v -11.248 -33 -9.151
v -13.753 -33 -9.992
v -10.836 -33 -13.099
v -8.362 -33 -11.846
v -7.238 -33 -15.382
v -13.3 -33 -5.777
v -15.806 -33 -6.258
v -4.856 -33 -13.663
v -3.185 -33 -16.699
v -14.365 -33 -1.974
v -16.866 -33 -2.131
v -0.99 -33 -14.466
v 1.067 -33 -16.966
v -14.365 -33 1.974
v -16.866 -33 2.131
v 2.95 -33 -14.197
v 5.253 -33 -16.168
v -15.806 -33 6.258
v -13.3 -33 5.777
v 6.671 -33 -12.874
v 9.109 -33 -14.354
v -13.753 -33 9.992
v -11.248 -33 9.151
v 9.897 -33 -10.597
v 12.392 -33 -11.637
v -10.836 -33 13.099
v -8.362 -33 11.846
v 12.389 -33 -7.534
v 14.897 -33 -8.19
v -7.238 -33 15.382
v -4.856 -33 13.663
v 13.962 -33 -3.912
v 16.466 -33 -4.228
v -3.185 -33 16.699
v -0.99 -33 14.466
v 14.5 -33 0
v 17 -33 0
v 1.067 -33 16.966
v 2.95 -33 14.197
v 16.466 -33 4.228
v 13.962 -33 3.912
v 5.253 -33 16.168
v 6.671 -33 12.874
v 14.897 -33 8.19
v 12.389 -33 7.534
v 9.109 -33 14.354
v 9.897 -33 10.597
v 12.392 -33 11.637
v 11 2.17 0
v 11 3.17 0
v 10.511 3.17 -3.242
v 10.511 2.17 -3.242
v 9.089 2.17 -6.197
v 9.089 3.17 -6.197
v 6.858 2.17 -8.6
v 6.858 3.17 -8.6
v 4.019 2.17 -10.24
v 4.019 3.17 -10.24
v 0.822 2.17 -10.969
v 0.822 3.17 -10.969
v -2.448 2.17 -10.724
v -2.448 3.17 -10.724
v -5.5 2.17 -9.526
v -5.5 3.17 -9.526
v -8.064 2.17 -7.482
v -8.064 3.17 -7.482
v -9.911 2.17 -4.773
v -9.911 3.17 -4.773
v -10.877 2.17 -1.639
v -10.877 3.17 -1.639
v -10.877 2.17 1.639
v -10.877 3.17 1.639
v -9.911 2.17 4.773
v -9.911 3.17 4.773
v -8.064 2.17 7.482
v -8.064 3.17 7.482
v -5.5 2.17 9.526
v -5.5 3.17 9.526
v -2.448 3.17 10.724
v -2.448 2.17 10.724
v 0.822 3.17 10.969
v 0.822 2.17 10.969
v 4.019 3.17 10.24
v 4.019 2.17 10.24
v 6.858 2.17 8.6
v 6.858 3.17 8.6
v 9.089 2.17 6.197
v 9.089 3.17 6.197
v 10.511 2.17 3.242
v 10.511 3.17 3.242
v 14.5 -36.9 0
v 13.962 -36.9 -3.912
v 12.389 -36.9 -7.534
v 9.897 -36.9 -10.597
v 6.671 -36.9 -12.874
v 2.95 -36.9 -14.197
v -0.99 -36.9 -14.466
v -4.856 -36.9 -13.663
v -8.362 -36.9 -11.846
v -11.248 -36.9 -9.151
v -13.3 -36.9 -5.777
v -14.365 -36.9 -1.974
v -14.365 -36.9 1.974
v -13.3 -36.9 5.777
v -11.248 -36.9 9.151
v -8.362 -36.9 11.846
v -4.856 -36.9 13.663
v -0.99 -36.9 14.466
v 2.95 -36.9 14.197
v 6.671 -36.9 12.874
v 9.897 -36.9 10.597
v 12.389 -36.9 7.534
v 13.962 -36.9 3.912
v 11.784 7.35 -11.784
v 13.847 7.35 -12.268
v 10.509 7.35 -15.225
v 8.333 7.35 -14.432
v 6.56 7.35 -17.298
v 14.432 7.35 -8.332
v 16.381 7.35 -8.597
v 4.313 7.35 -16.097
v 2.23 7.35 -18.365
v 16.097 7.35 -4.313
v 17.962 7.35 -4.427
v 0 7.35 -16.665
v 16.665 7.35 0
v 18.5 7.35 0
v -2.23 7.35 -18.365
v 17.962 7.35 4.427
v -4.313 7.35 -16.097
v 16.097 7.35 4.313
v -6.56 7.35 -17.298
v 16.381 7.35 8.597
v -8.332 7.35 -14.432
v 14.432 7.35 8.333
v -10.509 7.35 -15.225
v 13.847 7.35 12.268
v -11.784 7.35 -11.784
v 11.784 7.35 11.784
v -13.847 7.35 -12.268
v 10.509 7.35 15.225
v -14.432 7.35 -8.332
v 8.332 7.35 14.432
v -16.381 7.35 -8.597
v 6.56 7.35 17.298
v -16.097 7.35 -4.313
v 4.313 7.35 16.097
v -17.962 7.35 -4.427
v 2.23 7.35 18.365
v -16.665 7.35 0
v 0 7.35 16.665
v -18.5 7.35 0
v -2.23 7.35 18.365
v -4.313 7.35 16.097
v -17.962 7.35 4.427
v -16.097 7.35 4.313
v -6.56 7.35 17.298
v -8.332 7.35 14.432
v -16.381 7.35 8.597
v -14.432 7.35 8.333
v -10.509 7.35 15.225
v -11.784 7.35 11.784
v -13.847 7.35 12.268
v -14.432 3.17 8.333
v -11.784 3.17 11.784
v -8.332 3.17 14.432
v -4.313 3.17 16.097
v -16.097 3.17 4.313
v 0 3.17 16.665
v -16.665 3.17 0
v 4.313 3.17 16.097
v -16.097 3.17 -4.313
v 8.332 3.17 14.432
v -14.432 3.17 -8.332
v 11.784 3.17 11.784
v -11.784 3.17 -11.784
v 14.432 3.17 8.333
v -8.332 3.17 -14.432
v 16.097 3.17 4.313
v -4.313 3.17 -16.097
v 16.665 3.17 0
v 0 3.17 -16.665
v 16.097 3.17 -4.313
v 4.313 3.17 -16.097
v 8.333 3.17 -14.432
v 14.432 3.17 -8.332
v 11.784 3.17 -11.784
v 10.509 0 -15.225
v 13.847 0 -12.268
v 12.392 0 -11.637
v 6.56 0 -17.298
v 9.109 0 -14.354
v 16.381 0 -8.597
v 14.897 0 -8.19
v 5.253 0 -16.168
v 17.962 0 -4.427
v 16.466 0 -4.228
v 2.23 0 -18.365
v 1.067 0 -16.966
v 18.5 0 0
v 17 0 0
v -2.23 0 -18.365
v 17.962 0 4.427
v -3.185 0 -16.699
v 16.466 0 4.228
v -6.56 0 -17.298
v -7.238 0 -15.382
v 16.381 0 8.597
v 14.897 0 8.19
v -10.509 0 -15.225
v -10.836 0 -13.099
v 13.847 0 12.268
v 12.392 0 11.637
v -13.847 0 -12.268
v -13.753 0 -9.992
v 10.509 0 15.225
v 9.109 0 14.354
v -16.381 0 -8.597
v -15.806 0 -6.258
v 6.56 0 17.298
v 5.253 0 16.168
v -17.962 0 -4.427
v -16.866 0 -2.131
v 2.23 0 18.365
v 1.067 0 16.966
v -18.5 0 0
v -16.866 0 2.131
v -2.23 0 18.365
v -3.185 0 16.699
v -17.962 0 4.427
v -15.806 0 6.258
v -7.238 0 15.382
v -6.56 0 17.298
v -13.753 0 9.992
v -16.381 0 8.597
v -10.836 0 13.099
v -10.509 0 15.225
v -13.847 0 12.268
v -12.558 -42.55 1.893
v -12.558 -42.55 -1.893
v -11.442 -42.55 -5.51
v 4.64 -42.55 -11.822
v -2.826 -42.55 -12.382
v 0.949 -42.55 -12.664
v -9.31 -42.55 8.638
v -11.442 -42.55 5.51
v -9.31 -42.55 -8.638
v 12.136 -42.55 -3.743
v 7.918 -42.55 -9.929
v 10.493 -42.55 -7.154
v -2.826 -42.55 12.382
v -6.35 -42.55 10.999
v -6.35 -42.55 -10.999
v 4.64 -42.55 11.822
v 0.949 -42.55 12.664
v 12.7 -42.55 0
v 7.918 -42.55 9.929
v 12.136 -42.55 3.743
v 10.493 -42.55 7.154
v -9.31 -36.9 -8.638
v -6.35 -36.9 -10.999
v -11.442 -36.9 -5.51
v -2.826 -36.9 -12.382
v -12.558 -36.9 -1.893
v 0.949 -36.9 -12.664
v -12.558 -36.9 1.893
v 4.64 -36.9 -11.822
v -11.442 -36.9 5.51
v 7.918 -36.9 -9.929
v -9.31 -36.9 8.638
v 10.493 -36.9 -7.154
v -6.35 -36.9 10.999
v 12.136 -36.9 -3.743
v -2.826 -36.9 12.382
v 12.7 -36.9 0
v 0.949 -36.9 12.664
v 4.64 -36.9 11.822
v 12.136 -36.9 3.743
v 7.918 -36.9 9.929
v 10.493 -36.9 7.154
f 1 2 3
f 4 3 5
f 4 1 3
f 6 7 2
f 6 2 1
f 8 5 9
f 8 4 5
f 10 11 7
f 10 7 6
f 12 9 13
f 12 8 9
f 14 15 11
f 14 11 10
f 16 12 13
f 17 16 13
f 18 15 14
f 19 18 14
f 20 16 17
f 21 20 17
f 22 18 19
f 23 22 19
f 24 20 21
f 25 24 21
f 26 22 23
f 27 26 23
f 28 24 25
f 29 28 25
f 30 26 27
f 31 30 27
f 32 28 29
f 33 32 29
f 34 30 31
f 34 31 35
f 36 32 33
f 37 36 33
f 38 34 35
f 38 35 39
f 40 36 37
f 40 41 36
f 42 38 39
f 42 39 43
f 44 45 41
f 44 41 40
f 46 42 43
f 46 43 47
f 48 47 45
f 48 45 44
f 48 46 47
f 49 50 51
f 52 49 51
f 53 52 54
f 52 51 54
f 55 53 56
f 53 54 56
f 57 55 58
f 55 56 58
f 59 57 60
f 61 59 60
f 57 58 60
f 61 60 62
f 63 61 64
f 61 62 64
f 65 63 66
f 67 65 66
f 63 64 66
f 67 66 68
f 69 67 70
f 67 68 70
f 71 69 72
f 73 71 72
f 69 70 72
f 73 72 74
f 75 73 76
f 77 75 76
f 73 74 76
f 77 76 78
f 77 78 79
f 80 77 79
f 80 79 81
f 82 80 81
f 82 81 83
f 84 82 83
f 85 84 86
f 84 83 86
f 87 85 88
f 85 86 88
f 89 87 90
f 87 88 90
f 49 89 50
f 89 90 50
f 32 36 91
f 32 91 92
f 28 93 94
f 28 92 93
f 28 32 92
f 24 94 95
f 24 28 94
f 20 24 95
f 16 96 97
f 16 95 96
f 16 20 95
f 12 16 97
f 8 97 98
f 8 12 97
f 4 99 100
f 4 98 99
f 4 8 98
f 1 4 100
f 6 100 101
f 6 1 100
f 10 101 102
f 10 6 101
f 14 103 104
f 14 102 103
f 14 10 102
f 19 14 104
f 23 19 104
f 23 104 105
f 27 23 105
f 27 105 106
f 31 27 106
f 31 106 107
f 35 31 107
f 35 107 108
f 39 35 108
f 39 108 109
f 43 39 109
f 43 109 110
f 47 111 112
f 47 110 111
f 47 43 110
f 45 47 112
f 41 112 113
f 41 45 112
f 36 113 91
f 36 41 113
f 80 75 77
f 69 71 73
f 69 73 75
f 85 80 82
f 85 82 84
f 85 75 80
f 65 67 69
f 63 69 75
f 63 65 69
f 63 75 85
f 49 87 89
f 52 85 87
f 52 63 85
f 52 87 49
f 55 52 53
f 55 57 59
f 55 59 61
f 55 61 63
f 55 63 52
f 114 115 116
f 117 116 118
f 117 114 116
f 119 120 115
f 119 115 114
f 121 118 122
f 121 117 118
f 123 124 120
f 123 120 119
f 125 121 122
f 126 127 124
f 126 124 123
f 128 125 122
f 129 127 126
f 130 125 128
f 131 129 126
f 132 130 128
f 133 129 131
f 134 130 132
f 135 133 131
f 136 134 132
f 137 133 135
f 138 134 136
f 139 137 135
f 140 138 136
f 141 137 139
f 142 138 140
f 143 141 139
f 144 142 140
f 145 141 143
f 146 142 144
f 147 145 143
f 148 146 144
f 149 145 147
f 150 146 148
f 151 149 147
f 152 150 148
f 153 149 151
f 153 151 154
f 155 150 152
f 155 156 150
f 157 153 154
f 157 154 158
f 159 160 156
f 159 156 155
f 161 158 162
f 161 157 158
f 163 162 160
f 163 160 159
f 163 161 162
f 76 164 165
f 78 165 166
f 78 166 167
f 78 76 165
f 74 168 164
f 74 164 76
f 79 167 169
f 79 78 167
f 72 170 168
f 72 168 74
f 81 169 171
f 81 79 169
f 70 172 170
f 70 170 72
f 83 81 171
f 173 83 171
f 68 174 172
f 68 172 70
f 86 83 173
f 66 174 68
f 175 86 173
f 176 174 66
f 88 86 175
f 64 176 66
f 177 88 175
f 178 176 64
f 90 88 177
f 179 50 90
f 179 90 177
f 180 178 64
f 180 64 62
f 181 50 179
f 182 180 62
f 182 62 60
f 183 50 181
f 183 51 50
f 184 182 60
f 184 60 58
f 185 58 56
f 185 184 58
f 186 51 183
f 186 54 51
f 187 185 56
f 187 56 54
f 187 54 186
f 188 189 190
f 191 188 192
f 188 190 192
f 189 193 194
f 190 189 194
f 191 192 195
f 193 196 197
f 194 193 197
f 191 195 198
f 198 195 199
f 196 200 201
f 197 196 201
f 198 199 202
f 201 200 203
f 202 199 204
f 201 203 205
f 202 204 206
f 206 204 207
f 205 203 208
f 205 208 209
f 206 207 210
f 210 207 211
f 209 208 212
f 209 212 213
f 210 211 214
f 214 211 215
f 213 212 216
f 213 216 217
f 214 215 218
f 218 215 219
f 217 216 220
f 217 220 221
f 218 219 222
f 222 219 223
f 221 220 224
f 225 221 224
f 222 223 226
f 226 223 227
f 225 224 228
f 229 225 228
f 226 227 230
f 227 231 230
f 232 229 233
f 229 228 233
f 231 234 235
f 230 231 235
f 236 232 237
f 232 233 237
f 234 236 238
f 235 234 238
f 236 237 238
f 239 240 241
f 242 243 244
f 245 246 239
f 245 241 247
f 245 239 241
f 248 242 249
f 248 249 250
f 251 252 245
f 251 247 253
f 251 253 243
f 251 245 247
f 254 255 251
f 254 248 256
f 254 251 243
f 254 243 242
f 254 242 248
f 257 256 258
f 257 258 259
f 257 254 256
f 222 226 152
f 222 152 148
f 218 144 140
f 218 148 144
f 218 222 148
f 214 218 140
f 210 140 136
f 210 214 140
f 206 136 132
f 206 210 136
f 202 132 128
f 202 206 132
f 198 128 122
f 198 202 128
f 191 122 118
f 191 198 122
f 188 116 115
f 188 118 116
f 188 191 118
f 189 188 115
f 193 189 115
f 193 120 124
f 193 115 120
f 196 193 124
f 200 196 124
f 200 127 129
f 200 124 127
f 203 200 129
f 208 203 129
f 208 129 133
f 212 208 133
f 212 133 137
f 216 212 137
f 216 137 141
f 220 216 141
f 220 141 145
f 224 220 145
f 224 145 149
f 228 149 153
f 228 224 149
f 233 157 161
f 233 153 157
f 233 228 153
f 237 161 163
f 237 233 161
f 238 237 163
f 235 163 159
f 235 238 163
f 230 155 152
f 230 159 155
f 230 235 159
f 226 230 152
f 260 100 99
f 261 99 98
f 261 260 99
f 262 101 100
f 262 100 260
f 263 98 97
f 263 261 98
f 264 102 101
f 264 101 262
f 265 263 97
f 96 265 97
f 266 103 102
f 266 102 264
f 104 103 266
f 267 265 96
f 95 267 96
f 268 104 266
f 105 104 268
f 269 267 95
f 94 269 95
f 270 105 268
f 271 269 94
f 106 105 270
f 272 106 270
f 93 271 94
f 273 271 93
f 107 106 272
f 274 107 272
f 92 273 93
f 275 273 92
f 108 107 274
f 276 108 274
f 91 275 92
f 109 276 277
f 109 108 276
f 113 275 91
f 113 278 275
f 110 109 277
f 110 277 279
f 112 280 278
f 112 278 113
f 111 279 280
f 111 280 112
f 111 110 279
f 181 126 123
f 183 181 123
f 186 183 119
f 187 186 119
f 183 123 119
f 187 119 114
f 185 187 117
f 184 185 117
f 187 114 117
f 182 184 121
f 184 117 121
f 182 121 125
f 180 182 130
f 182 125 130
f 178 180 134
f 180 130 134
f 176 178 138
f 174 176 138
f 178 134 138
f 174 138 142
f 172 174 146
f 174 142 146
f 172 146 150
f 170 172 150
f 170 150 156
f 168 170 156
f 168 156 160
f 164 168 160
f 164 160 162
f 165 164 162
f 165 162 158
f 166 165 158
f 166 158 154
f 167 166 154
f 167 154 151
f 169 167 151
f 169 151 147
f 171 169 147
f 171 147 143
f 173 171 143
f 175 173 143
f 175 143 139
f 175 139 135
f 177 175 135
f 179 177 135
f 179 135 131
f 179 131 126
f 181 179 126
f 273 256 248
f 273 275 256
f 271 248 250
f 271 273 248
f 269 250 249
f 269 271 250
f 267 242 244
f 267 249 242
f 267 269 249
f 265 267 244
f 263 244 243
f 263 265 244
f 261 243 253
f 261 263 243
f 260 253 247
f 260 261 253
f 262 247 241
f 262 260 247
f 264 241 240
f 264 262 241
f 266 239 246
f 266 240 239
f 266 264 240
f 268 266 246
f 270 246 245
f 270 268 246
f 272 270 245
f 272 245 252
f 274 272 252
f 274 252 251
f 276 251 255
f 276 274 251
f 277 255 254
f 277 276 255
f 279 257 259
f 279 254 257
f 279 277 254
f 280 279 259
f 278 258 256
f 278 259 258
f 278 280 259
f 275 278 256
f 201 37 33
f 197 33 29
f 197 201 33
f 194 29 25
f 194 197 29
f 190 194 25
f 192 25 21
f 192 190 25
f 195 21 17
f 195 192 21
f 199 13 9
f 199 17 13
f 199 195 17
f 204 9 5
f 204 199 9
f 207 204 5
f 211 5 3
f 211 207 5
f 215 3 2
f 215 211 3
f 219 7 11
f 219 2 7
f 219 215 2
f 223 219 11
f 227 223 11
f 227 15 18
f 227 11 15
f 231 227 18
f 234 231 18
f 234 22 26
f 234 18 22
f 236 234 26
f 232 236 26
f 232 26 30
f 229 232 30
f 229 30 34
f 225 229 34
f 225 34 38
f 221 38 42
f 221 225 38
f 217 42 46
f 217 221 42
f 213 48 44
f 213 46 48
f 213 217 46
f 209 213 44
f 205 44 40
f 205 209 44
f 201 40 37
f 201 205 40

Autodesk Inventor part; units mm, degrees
ref_plane "YZ Plane" through (0, 0, 0) normal (1, 0, 0) x (0, 1, 0)
ref_plane "XZ Plane" through (0, 0, 0) normal (0, 1, 0) x (-1, 0, 0)
ref_plane "XY Plane" through (0, 0, 0) normal (0, 0, 1) x (1, 0, 0)
sketch "Sketch1" plane through (0, 0, 0) normal (0, 1, 0) x (-1, 0, 0)
  circle A0 centre (0, 0) radius 18.5
  dimension "d0" = 37
extrude "Extrusion1" add sketch "Sketch1" along normal blind 7.35
sketch "Sketch2" plane through (0, 7.35, 0) normal (0, 1, 0) x (1, 0, 0)
  circle A0 centre (0, 0) radius 16.665
  dimension "d3" = 33.33
extrude "Extrusion2" cut sketch "Sketch2" against normal blind 4.18
sketch "Sketch3" plane through (0, 0, 0) normal (0, -1, 0) x (1, 0, 0)
  circle A0 centre (0, 0) radius 17
  dimension "d6" = 34
extrude "Extrusion3" add sketch "Sketch3" along normal blind 33
sketch "Sketch4" plane through (0, -33, 0) normal (0, -1, 0) x (1, 0, 0)
  circle A0 centre (0, 0) radius 14.5
  dimension "d9" = 29
extrude "Extrusion4" add sketch "Sketch4" along normal blind 3.9
sketch "Sketch5" plane through (0, -36.9, 0) normal (0, -1, 0) x (1, 0, 0)
  circle A0 centre (0, 0) radius 12.7
  dimension "d12" = 25.4
extrude "Extrusion5" add sketch "Sketch5" along normal blind 5.65
thread "Thread1" size "M26x1.5" class "6g" standard "ANSI Metric M Profile" full length
sketch "Sketch6" plane through (0, 3.17, 0) normal (0, 1, 0) x (1, 0, 0)
  circle A0 centre (0, 0) radius 11
  dimension "d17" = 22
extrude "Extrusion6" cut sketch "Sketch6" against normal blind 1
properties part number "Tamron_M118M06"
